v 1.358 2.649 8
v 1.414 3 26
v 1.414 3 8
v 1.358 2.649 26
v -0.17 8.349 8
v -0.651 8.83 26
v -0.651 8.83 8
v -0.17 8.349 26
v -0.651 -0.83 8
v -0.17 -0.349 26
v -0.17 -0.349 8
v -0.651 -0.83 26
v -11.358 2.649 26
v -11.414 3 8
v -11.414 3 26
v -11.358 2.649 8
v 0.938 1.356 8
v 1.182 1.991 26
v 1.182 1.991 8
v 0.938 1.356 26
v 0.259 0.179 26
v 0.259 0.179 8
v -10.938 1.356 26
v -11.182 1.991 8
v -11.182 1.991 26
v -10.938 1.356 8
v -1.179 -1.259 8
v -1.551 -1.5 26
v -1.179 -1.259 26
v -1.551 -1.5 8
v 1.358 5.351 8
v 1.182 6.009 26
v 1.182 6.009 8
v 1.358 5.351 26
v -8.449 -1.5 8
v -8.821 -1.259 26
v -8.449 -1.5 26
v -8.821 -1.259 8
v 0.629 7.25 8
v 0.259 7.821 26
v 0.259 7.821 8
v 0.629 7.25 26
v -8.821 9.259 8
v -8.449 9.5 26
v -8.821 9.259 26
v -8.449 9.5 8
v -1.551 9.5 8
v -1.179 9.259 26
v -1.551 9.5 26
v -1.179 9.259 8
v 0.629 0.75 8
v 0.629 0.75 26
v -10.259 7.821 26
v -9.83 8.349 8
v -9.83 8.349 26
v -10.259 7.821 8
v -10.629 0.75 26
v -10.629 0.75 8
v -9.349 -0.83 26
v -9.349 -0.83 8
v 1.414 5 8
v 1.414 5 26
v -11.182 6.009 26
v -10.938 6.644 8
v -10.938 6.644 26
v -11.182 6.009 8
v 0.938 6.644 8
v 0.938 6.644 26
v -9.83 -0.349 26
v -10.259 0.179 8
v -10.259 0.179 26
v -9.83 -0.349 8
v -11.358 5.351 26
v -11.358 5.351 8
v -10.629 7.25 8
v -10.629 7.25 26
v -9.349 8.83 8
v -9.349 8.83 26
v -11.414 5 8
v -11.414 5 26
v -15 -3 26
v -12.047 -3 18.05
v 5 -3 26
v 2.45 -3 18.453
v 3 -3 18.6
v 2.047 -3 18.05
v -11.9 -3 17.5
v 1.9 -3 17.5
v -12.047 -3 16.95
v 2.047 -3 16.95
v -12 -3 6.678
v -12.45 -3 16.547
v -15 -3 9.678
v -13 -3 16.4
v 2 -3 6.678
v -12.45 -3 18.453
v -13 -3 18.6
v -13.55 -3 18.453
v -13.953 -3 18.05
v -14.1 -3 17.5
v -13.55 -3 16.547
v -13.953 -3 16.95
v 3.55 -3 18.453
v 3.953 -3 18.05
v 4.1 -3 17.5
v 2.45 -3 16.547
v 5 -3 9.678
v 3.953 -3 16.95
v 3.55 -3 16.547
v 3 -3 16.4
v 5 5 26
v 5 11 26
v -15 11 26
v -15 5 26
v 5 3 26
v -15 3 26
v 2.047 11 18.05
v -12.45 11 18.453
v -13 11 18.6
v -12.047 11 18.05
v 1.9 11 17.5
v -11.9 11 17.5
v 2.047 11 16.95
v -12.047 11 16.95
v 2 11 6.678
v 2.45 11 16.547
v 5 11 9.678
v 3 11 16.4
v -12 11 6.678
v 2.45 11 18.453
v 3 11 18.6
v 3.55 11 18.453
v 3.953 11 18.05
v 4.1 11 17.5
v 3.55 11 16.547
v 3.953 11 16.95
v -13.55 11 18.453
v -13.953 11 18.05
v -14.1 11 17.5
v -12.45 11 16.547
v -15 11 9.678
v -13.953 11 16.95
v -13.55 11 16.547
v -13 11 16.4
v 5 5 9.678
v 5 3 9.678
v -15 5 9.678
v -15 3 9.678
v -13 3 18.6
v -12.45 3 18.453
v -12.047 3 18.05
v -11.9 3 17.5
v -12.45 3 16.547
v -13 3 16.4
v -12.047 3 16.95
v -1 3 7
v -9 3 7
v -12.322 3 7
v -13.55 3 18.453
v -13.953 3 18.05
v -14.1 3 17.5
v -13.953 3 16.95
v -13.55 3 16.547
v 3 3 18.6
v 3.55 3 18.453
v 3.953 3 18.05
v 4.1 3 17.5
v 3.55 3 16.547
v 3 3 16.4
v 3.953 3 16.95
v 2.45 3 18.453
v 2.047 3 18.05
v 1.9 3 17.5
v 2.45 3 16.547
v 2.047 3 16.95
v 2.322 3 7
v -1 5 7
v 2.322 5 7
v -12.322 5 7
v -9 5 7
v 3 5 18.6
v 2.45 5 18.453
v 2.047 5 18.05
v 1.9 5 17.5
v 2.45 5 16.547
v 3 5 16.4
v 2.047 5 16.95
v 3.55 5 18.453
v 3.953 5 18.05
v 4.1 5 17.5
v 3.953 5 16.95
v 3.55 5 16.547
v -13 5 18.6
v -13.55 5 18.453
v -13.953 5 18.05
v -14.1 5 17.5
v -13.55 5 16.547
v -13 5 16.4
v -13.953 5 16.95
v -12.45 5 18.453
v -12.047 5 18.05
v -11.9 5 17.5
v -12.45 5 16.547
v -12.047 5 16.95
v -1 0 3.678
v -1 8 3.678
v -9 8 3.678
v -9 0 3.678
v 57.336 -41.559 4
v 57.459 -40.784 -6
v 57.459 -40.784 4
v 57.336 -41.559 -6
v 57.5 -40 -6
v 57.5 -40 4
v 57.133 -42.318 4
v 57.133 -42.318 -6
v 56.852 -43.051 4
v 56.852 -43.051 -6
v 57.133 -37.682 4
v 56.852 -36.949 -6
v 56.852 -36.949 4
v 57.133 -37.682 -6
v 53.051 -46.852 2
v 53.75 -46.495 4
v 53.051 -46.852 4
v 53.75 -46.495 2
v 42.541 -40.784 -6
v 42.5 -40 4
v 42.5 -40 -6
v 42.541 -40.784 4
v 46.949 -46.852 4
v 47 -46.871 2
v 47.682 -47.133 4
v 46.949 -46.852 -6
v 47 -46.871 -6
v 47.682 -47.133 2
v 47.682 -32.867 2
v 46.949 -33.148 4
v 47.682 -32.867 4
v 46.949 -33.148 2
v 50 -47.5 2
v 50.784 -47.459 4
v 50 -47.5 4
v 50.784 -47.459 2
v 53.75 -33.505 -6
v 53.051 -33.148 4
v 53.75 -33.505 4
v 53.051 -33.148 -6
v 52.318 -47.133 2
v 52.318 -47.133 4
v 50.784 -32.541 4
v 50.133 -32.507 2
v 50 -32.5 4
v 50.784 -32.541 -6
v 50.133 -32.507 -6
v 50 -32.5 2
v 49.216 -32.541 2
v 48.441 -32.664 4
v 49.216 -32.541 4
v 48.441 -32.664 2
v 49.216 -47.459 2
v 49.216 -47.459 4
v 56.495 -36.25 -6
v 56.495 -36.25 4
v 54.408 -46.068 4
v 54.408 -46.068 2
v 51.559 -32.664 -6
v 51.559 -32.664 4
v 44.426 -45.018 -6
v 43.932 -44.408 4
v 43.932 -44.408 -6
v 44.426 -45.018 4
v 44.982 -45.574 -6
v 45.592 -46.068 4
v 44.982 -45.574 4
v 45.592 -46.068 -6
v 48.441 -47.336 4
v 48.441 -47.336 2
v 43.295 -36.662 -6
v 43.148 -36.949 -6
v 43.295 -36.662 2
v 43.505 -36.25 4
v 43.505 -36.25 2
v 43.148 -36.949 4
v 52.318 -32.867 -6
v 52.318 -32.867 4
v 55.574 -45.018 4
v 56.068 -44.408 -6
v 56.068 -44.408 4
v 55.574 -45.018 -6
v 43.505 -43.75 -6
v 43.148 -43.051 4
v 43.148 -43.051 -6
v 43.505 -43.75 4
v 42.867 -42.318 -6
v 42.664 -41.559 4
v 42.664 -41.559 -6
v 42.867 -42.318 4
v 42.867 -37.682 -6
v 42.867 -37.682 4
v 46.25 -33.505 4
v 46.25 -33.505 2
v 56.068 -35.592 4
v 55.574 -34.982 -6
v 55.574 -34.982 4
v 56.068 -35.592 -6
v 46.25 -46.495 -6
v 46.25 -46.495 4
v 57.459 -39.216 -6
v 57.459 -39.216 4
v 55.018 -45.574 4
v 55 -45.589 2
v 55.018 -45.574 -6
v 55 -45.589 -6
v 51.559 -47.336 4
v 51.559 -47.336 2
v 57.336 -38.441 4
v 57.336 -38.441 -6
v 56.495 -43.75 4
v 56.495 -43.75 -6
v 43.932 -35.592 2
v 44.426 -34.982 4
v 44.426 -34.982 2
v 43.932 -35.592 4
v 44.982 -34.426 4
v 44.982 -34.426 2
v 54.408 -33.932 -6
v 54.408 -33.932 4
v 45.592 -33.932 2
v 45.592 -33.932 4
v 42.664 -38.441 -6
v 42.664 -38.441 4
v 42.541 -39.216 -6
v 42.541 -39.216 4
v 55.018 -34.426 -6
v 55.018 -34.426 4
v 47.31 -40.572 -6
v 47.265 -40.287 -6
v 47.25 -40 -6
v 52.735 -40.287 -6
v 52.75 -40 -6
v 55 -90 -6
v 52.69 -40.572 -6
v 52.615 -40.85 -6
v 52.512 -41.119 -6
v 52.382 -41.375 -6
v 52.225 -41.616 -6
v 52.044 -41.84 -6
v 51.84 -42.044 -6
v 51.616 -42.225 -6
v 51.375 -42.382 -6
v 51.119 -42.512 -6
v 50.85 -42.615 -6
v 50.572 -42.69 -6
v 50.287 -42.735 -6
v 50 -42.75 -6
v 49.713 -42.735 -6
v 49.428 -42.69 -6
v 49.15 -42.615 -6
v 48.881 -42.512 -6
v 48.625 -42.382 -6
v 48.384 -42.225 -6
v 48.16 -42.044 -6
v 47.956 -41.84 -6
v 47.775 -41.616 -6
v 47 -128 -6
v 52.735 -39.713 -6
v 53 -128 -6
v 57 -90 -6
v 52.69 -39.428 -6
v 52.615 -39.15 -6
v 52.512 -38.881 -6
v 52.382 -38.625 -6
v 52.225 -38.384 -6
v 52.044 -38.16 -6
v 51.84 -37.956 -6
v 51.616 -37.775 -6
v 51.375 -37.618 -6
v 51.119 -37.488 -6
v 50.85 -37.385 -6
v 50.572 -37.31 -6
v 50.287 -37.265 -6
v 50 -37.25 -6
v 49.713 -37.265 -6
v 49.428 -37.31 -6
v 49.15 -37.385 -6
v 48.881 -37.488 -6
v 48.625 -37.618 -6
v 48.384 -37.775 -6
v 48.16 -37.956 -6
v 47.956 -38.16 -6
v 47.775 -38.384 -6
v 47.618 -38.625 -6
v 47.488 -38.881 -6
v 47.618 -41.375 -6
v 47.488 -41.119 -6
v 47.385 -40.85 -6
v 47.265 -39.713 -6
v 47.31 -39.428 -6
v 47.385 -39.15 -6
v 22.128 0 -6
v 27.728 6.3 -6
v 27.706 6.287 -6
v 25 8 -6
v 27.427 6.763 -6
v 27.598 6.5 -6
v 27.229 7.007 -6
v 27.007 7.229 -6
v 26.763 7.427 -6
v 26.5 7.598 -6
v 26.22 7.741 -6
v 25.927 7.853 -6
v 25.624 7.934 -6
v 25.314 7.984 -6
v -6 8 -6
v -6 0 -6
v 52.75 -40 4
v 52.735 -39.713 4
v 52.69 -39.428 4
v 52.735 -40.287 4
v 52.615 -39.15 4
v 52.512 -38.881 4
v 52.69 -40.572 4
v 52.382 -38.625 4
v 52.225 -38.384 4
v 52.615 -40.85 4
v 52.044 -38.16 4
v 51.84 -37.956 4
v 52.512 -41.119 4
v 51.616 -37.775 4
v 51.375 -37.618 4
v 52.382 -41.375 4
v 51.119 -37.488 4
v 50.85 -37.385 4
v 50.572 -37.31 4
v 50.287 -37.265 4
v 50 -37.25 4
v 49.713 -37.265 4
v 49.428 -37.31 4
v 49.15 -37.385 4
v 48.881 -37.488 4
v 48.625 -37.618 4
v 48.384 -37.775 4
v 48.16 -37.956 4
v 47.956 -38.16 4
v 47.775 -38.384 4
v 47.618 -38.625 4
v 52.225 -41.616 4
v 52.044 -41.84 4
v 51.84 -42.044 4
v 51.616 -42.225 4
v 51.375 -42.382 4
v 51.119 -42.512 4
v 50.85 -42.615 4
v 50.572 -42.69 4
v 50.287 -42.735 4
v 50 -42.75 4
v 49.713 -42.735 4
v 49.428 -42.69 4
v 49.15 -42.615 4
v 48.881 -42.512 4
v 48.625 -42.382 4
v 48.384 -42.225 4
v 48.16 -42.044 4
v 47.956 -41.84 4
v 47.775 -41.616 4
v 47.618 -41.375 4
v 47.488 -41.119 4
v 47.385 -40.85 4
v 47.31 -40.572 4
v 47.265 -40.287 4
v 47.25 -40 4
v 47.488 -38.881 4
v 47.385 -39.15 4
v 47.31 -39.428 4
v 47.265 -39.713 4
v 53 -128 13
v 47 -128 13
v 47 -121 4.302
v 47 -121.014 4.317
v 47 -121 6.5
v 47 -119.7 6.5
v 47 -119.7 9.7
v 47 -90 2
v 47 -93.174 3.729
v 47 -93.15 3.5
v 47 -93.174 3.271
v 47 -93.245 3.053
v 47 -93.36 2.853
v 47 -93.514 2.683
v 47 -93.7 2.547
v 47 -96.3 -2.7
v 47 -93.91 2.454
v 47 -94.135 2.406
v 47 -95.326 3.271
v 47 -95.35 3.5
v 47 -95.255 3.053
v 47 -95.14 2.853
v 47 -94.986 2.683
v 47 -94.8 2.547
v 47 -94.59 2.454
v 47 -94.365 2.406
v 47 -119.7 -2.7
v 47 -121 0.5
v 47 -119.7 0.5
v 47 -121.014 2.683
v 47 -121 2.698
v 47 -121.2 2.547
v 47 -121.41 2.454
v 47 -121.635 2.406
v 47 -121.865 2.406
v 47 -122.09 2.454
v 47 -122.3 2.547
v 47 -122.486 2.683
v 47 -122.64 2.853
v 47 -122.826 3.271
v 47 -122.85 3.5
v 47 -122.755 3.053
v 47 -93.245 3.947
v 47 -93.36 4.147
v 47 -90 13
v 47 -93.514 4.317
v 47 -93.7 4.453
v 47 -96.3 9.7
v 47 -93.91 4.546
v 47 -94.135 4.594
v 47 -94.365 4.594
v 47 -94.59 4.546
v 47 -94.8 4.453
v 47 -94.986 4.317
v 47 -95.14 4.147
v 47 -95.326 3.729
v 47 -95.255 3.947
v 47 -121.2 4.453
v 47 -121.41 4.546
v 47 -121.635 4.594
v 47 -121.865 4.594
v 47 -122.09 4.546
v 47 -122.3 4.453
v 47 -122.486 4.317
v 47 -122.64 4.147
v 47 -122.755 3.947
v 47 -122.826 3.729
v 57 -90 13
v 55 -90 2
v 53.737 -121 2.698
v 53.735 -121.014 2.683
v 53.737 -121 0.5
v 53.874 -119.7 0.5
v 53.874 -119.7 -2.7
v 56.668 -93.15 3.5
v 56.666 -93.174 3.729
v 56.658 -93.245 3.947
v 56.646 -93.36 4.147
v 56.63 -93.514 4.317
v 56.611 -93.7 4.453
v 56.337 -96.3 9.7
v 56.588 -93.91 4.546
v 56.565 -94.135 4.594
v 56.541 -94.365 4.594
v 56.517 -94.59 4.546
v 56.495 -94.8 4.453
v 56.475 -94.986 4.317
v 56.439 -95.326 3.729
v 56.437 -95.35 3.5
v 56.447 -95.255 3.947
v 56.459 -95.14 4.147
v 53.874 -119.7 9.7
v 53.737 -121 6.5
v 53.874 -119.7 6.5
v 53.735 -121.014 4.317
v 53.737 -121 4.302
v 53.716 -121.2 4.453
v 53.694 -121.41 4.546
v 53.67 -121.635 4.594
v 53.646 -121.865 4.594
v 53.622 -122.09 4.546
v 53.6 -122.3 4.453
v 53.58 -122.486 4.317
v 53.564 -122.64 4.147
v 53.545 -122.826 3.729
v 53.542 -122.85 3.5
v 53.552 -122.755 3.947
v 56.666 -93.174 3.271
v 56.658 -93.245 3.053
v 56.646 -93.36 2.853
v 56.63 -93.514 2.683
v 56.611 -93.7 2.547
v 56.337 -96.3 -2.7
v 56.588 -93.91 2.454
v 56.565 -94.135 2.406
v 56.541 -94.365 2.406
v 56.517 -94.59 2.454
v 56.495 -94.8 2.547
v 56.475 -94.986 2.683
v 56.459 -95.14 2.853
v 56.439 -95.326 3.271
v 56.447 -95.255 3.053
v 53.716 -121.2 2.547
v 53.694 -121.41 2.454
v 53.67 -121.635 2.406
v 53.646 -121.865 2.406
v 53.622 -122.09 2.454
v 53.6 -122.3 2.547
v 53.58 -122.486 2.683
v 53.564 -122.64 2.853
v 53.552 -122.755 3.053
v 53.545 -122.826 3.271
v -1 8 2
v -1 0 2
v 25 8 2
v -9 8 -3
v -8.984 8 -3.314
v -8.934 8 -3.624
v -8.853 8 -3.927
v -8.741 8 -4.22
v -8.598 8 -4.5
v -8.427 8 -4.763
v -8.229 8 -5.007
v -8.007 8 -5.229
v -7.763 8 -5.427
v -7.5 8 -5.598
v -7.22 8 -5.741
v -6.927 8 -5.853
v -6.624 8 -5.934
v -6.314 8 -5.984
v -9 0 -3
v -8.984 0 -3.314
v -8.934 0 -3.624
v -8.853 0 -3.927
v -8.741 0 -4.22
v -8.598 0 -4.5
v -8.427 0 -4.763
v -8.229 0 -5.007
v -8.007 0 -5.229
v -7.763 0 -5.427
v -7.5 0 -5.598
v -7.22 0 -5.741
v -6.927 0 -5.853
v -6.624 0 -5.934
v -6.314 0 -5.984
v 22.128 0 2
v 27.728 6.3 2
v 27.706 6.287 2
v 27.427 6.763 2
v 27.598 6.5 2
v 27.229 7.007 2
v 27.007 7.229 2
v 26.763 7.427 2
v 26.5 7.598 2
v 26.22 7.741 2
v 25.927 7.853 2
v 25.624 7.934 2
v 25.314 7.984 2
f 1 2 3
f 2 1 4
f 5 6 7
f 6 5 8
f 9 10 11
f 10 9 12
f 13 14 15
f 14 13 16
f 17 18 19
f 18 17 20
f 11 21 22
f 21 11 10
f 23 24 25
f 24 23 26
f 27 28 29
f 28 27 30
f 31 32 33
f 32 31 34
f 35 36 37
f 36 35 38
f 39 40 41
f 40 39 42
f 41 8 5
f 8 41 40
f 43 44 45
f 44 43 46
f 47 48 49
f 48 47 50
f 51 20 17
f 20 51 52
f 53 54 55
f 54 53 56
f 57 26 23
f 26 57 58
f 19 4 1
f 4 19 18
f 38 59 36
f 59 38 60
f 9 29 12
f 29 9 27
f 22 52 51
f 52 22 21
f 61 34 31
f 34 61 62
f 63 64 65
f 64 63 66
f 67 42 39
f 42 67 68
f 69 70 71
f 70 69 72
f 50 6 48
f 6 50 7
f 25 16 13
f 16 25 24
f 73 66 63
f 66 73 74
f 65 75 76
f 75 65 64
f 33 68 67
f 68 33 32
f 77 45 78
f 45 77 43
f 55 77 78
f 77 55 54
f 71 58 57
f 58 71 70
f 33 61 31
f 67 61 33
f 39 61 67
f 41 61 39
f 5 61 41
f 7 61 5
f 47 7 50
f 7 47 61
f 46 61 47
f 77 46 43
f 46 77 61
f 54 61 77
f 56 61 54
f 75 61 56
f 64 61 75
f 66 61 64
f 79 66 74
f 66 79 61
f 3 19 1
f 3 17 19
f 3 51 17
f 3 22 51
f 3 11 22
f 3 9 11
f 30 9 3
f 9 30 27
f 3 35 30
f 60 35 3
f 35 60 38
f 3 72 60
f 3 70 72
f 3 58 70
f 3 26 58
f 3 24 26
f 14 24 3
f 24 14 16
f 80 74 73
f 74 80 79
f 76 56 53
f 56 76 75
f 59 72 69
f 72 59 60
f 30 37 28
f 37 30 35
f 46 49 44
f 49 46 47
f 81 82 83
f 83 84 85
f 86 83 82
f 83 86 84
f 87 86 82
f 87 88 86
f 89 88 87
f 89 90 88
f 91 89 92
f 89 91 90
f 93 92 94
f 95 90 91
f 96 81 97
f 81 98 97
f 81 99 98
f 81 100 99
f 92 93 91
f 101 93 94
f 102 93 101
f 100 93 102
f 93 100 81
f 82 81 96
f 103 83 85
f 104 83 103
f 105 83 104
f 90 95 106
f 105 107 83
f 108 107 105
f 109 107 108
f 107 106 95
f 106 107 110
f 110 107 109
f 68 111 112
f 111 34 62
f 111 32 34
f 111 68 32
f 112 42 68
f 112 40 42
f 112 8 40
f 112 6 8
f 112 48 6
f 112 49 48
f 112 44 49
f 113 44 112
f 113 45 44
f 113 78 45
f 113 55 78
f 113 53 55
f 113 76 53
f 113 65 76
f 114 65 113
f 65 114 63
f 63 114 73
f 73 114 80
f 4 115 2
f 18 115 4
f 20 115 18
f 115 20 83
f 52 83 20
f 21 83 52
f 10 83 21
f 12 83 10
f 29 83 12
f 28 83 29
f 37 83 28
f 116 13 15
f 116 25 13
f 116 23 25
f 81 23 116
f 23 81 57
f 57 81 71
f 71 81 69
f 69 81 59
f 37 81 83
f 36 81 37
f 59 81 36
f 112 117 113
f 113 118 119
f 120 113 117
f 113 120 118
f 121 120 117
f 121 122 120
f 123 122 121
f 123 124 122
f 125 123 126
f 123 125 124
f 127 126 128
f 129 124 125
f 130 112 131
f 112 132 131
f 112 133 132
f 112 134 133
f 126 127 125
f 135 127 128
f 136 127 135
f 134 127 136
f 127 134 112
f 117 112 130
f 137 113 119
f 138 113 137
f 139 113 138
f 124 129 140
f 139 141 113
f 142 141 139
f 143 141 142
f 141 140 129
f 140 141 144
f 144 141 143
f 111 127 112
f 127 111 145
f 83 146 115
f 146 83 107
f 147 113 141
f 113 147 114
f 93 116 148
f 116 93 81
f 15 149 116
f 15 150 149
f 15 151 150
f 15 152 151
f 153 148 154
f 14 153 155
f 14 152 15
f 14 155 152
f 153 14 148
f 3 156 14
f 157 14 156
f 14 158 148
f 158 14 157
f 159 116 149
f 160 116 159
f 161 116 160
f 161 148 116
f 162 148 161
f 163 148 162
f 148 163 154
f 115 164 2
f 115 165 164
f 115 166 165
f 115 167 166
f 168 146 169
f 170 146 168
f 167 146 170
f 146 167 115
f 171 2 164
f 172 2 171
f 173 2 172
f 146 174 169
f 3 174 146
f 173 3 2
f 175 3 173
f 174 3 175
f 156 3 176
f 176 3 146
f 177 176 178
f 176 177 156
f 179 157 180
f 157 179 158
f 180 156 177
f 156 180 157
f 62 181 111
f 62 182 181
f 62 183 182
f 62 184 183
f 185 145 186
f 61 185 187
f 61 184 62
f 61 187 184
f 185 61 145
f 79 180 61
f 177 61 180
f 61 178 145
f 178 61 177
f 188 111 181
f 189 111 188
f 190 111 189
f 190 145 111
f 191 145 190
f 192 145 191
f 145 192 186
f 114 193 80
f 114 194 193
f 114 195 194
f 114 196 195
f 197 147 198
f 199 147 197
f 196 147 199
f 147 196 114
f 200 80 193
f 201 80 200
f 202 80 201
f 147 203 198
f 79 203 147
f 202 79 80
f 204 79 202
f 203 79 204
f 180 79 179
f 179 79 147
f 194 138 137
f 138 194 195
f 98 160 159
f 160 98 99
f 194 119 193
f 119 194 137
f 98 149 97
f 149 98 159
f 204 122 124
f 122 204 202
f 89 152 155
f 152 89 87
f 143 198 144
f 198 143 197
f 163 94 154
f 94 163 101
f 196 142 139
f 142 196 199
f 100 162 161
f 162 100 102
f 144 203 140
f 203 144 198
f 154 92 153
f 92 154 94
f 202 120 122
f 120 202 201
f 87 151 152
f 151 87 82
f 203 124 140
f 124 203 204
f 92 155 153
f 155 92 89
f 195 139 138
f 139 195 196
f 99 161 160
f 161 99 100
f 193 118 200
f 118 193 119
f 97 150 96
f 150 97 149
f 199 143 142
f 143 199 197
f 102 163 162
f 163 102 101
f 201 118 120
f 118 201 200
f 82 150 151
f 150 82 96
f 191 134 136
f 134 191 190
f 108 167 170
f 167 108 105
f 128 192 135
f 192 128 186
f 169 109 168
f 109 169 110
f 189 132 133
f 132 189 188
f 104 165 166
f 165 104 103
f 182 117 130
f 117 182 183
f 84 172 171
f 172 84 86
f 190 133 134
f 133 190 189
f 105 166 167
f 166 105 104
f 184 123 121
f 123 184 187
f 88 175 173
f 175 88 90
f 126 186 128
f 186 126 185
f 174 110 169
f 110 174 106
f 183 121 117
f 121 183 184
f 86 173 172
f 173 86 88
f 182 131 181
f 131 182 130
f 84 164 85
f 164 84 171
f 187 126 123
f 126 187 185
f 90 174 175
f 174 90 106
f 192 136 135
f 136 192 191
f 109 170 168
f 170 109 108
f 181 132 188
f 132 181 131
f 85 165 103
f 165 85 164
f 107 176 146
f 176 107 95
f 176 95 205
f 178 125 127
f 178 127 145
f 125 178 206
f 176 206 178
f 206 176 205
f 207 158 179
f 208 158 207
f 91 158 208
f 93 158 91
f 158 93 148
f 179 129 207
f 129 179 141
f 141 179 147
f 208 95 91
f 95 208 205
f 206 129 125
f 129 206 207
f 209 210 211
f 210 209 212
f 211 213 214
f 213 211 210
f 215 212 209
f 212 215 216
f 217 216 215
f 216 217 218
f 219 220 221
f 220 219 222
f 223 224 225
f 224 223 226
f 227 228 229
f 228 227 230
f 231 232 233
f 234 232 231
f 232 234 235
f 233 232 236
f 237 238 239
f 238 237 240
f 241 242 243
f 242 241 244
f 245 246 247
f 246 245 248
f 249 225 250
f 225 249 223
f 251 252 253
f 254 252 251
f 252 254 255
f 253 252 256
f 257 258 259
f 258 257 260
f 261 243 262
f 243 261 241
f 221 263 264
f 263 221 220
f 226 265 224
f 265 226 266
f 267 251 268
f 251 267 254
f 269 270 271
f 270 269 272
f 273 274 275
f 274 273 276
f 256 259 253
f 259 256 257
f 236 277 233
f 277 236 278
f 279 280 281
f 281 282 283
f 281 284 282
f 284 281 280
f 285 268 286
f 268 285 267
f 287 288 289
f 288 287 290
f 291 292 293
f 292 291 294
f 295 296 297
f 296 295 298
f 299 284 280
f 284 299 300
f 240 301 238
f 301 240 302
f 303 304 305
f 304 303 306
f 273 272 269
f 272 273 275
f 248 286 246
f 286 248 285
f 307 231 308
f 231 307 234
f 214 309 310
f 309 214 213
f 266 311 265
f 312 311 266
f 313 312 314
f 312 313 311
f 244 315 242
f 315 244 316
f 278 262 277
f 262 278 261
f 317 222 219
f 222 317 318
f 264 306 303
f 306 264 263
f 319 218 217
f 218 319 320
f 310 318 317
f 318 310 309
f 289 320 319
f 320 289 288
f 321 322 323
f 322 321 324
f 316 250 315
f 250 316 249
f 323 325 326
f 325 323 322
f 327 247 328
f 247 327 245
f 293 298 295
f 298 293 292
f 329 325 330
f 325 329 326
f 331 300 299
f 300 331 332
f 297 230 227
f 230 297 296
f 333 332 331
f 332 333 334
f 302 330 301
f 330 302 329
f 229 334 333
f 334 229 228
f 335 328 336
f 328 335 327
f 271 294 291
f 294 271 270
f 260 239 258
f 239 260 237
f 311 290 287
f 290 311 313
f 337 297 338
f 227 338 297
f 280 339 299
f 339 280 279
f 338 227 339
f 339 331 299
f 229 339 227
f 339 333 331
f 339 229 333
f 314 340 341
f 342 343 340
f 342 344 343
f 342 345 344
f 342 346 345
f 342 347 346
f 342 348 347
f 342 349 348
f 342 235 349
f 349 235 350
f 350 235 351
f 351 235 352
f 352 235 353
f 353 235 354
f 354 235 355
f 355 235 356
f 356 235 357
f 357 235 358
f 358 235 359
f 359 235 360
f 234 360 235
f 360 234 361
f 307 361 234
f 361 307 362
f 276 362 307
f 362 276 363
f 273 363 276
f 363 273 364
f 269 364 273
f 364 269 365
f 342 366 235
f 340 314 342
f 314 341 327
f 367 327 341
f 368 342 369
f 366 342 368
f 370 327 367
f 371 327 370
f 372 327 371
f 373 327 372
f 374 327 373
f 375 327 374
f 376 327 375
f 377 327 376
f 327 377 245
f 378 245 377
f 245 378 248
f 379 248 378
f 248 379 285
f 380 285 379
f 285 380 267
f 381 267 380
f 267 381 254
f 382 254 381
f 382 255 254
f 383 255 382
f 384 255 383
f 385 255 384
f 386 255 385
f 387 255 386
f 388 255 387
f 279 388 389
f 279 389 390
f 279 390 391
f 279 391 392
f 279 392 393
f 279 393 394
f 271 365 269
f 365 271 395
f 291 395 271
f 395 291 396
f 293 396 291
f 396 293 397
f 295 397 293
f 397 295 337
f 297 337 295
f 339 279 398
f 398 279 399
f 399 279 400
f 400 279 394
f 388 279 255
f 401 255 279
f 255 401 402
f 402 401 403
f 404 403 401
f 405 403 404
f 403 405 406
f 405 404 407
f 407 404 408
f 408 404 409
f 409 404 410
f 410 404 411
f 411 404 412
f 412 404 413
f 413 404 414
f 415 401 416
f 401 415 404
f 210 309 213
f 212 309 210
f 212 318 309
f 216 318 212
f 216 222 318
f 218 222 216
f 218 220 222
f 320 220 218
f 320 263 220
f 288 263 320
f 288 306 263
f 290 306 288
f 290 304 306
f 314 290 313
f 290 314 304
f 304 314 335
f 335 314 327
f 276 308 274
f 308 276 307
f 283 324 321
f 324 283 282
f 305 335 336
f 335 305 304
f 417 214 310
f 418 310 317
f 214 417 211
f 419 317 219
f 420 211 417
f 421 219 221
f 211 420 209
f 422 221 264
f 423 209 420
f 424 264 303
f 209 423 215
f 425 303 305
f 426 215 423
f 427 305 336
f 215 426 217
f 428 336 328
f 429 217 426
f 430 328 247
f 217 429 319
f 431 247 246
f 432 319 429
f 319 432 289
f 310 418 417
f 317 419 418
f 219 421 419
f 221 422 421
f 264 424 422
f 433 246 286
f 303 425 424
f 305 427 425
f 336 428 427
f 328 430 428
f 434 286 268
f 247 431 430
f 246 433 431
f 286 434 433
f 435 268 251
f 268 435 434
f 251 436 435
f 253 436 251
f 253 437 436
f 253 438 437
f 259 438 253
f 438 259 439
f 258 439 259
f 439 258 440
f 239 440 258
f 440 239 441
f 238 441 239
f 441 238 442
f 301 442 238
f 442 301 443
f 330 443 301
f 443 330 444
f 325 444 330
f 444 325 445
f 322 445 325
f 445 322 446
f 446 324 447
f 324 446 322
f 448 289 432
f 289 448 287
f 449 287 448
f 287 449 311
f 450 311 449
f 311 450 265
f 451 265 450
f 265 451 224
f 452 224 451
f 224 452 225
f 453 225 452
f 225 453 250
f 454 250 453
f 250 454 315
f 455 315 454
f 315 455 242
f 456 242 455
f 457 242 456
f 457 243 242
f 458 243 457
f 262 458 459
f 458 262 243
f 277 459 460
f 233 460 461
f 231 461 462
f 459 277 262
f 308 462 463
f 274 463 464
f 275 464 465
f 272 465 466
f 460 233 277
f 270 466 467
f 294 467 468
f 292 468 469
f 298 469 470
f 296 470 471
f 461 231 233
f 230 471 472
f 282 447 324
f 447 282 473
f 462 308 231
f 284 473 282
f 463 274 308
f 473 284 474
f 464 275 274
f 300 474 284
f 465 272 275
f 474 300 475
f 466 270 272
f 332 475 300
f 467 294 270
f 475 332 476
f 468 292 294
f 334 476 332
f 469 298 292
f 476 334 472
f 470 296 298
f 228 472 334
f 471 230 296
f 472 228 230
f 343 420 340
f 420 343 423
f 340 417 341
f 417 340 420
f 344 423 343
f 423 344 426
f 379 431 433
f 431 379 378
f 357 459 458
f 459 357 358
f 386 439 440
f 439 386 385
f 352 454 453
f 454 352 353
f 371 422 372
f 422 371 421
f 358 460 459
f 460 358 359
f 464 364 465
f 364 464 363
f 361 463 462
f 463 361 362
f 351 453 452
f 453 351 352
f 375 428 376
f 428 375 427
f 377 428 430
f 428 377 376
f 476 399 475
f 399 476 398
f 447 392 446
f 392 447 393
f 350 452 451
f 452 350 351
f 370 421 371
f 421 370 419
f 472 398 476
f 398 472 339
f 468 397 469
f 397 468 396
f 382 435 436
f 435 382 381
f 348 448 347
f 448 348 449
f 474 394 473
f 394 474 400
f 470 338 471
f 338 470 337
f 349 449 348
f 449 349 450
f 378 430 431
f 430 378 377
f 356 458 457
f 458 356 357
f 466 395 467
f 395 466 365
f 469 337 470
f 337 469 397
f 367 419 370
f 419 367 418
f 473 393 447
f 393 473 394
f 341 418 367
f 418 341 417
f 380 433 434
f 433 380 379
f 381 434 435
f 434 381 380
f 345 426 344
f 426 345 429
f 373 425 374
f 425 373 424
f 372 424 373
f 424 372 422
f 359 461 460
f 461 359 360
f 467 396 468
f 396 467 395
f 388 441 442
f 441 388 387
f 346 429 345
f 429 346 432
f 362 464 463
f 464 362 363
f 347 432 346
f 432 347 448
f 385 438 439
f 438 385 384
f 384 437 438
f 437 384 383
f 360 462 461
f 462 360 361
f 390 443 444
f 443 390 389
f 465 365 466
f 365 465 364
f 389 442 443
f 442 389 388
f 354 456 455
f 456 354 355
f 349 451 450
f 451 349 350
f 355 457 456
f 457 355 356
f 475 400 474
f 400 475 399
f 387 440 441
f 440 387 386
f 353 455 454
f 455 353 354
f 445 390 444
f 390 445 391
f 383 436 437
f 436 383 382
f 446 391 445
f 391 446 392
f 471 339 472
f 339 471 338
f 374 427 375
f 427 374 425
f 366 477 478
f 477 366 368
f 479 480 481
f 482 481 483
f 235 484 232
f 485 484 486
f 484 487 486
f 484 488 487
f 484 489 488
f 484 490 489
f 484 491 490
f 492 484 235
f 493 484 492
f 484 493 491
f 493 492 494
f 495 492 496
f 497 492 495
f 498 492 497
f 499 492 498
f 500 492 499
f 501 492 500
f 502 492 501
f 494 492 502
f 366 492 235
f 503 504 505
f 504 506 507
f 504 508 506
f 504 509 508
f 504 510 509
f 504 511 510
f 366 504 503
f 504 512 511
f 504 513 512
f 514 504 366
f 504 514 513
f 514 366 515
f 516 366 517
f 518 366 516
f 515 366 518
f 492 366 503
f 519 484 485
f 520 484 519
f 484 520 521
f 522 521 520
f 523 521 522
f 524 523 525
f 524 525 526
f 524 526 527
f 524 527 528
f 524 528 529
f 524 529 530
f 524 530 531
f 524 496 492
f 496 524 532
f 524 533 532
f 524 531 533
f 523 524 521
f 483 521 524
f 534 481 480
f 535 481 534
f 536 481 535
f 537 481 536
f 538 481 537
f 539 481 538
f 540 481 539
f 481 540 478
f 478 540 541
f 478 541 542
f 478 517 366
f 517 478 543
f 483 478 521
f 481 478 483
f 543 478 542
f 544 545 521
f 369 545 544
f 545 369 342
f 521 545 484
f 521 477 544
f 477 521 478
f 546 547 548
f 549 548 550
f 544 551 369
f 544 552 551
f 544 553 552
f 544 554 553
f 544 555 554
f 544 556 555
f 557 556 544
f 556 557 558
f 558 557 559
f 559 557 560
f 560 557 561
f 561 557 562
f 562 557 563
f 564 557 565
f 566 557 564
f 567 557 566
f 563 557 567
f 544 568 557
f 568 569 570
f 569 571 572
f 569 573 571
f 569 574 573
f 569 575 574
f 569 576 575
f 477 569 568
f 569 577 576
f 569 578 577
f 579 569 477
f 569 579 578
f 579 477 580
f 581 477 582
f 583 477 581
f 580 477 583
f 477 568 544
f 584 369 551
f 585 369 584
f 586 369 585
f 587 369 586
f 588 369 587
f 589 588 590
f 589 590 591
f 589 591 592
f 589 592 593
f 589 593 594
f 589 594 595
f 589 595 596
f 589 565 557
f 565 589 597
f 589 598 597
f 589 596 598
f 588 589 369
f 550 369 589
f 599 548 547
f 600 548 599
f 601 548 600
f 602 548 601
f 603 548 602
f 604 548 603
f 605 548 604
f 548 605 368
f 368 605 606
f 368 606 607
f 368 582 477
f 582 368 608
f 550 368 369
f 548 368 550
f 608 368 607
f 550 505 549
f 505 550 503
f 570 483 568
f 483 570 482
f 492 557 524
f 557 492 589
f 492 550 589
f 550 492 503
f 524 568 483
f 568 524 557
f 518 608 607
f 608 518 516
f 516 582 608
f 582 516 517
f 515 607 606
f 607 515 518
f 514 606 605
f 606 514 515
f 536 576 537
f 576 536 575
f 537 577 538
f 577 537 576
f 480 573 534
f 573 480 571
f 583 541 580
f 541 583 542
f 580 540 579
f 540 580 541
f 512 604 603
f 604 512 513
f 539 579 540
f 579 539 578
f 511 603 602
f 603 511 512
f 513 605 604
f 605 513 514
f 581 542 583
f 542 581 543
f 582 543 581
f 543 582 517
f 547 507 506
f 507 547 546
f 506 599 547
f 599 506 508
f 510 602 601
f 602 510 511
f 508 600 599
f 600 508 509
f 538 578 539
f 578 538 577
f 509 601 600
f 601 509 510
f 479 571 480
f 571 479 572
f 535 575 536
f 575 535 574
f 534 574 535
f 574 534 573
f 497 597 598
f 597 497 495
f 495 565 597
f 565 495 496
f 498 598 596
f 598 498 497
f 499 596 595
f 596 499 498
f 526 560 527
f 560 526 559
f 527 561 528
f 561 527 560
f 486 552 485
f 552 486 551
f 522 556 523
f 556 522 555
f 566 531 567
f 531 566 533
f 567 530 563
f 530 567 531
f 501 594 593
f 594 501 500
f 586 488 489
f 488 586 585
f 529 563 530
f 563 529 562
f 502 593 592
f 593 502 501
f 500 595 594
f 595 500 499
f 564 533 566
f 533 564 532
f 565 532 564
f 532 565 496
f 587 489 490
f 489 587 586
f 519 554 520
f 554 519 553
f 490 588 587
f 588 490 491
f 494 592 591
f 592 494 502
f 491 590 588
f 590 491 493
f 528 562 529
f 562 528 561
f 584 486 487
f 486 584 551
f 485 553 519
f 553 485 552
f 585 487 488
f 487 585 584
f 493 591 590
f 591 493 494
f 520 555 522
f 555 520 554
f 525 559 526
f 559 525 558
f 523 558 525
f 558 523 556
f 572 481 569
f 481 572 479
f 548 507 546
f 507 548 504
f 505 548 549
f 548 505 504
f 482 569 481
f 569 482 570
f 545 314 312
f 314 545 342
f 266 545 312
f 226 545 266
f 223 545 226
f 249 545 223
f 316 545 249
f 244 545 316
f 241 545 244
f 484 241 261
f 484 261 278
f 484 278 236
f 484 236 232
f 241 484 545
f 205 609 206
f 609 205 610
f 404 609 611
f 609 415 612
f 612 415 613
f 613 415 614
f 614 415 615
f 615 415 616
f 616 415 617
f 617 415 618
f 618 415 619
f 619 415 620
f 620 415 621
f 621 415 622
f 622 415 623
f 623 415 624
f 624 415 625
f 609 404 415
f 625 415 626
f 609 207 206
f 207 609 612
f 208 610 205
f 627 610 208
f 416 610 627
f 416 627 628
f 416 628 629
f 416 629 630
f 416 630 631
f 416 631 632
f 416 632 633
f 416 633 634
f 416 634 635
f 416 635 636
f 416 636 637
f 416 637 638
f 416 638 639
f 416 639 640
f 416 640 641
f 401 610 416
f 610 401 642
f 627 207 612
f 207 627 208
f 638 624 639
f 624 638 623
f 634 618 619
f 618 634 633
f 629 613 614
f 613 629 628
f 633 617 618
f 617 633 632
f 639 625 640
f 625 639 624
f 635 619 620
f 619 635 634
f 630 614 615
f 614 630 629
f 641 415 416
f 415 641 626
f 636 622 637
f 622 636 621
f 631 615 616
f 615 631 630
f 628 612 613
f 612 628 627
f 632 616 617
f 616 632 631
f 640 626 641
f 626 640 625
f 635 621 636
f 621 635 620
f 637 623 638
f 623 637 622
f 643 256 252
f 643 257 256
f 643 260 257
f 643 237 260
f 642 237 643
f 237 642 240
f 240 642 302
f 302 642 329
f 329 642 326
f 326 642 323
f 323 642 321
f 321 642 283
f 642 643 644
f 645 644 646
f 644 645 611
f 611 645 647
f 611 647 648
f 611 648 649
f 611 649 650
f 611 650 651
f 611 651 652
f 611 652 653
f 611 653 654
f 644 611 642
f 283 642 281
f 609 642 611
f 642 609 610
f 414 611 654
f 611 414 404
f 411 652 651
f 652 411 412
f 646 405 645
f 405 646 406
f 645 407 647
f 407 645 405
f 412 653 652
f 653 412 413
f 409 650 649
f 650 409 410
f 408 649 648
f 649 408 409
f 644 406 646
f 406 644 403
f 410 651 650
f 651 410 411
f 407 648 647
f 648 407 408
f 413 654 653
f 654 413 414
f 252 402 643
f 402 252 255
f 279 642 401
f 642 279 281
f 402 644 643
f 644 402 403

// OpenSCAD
rotate([-90,0,0])
{
rotate([90,90,0])translate([-4,-5,3])clamp();

$fn=60;

translate([-9,-7,0])cube([8,10,8]);
translate([-6,3,0])rotate([0,0,-90])
cylinder(d=6,h=8);
translate([-6,-2,0])cube([31,8,8]);
translate([25,6,5])rotate([90,0,0])
cylinder(d=6,h=8);
translate([20.8,-2,2.3])rotate([0,60,0])
cube([47,8,8]);
difference(){
translate([50,-4,-40])rotate([-90,0,0])
cylinder(d=15,h=10);
translate([50,-5,-40])rotate([-90,0,0])
cylinder(d=5.5,h=12);
}
translate([47,0,-45])
rotate([0,90,0])
{
    translate([0,-2,0])cube([47,8,8]);
    translate([63,-3.5,0])rotate([0,0,0])
    servo_bracket();
}
}

module clamp(){
difference(){
translate([-7,-10,0])
cube([14,20,23]);
difference(){
    translate([0,0,5])cylinder(d=13,h=25,$fn=60);
    translate([6.5,0,12])cube([2,12,25],center=true);
    translate([-6.5,0,12])cube([2,12,25],center=true);
}
translate([-1,-11,4])cube([2,22,25]);
translate([-9,-8,14.5])rotate([0,90,0])
cylinder(d=2.2,h=21,$fn=12);
translate([-9,8,14.5])rotate([0,90,0])
cylinder(d=2.2,h=21,$fn=12);
translate([0,21,0])rotate([45,0,0])cube(size=[25,25,25],center=true);
translate([0,-21,0])rotate([45,0,0])cube(size=[25,25,25],center=true);
translate([21,0,0])rotate([0,0,90])rotate([45,0,0])
cube(size=[25,25,25],center=true);
translate([-21,0,0])rotate([0,0,90])rotate([45,0,0])
cube(size=[25,25,25],center=true);
}
}

module servo_bracket(){
difference(){
union(){
translate([1,0,3])cube([38,19,6],center=true);
translate([0,9.5,2])
rotate([90,0,0])linear_extrude(height=19)
polygon([[-18,0],[20,4],[-18,8]]);
translate([13.75,0,0])cylinder(d=8,h=2,$fn=60);
}
cube([23.4,12.4,50],center=true);
translate([13.75,0,-1])cylinder(d=2.2,h=60,$fn=30);
translate([-13.75,0,-1])cylinder(d=2.2,h=50,$fn=30);
translate([7,-3,-1])cube([6,6,12]);
}
}
